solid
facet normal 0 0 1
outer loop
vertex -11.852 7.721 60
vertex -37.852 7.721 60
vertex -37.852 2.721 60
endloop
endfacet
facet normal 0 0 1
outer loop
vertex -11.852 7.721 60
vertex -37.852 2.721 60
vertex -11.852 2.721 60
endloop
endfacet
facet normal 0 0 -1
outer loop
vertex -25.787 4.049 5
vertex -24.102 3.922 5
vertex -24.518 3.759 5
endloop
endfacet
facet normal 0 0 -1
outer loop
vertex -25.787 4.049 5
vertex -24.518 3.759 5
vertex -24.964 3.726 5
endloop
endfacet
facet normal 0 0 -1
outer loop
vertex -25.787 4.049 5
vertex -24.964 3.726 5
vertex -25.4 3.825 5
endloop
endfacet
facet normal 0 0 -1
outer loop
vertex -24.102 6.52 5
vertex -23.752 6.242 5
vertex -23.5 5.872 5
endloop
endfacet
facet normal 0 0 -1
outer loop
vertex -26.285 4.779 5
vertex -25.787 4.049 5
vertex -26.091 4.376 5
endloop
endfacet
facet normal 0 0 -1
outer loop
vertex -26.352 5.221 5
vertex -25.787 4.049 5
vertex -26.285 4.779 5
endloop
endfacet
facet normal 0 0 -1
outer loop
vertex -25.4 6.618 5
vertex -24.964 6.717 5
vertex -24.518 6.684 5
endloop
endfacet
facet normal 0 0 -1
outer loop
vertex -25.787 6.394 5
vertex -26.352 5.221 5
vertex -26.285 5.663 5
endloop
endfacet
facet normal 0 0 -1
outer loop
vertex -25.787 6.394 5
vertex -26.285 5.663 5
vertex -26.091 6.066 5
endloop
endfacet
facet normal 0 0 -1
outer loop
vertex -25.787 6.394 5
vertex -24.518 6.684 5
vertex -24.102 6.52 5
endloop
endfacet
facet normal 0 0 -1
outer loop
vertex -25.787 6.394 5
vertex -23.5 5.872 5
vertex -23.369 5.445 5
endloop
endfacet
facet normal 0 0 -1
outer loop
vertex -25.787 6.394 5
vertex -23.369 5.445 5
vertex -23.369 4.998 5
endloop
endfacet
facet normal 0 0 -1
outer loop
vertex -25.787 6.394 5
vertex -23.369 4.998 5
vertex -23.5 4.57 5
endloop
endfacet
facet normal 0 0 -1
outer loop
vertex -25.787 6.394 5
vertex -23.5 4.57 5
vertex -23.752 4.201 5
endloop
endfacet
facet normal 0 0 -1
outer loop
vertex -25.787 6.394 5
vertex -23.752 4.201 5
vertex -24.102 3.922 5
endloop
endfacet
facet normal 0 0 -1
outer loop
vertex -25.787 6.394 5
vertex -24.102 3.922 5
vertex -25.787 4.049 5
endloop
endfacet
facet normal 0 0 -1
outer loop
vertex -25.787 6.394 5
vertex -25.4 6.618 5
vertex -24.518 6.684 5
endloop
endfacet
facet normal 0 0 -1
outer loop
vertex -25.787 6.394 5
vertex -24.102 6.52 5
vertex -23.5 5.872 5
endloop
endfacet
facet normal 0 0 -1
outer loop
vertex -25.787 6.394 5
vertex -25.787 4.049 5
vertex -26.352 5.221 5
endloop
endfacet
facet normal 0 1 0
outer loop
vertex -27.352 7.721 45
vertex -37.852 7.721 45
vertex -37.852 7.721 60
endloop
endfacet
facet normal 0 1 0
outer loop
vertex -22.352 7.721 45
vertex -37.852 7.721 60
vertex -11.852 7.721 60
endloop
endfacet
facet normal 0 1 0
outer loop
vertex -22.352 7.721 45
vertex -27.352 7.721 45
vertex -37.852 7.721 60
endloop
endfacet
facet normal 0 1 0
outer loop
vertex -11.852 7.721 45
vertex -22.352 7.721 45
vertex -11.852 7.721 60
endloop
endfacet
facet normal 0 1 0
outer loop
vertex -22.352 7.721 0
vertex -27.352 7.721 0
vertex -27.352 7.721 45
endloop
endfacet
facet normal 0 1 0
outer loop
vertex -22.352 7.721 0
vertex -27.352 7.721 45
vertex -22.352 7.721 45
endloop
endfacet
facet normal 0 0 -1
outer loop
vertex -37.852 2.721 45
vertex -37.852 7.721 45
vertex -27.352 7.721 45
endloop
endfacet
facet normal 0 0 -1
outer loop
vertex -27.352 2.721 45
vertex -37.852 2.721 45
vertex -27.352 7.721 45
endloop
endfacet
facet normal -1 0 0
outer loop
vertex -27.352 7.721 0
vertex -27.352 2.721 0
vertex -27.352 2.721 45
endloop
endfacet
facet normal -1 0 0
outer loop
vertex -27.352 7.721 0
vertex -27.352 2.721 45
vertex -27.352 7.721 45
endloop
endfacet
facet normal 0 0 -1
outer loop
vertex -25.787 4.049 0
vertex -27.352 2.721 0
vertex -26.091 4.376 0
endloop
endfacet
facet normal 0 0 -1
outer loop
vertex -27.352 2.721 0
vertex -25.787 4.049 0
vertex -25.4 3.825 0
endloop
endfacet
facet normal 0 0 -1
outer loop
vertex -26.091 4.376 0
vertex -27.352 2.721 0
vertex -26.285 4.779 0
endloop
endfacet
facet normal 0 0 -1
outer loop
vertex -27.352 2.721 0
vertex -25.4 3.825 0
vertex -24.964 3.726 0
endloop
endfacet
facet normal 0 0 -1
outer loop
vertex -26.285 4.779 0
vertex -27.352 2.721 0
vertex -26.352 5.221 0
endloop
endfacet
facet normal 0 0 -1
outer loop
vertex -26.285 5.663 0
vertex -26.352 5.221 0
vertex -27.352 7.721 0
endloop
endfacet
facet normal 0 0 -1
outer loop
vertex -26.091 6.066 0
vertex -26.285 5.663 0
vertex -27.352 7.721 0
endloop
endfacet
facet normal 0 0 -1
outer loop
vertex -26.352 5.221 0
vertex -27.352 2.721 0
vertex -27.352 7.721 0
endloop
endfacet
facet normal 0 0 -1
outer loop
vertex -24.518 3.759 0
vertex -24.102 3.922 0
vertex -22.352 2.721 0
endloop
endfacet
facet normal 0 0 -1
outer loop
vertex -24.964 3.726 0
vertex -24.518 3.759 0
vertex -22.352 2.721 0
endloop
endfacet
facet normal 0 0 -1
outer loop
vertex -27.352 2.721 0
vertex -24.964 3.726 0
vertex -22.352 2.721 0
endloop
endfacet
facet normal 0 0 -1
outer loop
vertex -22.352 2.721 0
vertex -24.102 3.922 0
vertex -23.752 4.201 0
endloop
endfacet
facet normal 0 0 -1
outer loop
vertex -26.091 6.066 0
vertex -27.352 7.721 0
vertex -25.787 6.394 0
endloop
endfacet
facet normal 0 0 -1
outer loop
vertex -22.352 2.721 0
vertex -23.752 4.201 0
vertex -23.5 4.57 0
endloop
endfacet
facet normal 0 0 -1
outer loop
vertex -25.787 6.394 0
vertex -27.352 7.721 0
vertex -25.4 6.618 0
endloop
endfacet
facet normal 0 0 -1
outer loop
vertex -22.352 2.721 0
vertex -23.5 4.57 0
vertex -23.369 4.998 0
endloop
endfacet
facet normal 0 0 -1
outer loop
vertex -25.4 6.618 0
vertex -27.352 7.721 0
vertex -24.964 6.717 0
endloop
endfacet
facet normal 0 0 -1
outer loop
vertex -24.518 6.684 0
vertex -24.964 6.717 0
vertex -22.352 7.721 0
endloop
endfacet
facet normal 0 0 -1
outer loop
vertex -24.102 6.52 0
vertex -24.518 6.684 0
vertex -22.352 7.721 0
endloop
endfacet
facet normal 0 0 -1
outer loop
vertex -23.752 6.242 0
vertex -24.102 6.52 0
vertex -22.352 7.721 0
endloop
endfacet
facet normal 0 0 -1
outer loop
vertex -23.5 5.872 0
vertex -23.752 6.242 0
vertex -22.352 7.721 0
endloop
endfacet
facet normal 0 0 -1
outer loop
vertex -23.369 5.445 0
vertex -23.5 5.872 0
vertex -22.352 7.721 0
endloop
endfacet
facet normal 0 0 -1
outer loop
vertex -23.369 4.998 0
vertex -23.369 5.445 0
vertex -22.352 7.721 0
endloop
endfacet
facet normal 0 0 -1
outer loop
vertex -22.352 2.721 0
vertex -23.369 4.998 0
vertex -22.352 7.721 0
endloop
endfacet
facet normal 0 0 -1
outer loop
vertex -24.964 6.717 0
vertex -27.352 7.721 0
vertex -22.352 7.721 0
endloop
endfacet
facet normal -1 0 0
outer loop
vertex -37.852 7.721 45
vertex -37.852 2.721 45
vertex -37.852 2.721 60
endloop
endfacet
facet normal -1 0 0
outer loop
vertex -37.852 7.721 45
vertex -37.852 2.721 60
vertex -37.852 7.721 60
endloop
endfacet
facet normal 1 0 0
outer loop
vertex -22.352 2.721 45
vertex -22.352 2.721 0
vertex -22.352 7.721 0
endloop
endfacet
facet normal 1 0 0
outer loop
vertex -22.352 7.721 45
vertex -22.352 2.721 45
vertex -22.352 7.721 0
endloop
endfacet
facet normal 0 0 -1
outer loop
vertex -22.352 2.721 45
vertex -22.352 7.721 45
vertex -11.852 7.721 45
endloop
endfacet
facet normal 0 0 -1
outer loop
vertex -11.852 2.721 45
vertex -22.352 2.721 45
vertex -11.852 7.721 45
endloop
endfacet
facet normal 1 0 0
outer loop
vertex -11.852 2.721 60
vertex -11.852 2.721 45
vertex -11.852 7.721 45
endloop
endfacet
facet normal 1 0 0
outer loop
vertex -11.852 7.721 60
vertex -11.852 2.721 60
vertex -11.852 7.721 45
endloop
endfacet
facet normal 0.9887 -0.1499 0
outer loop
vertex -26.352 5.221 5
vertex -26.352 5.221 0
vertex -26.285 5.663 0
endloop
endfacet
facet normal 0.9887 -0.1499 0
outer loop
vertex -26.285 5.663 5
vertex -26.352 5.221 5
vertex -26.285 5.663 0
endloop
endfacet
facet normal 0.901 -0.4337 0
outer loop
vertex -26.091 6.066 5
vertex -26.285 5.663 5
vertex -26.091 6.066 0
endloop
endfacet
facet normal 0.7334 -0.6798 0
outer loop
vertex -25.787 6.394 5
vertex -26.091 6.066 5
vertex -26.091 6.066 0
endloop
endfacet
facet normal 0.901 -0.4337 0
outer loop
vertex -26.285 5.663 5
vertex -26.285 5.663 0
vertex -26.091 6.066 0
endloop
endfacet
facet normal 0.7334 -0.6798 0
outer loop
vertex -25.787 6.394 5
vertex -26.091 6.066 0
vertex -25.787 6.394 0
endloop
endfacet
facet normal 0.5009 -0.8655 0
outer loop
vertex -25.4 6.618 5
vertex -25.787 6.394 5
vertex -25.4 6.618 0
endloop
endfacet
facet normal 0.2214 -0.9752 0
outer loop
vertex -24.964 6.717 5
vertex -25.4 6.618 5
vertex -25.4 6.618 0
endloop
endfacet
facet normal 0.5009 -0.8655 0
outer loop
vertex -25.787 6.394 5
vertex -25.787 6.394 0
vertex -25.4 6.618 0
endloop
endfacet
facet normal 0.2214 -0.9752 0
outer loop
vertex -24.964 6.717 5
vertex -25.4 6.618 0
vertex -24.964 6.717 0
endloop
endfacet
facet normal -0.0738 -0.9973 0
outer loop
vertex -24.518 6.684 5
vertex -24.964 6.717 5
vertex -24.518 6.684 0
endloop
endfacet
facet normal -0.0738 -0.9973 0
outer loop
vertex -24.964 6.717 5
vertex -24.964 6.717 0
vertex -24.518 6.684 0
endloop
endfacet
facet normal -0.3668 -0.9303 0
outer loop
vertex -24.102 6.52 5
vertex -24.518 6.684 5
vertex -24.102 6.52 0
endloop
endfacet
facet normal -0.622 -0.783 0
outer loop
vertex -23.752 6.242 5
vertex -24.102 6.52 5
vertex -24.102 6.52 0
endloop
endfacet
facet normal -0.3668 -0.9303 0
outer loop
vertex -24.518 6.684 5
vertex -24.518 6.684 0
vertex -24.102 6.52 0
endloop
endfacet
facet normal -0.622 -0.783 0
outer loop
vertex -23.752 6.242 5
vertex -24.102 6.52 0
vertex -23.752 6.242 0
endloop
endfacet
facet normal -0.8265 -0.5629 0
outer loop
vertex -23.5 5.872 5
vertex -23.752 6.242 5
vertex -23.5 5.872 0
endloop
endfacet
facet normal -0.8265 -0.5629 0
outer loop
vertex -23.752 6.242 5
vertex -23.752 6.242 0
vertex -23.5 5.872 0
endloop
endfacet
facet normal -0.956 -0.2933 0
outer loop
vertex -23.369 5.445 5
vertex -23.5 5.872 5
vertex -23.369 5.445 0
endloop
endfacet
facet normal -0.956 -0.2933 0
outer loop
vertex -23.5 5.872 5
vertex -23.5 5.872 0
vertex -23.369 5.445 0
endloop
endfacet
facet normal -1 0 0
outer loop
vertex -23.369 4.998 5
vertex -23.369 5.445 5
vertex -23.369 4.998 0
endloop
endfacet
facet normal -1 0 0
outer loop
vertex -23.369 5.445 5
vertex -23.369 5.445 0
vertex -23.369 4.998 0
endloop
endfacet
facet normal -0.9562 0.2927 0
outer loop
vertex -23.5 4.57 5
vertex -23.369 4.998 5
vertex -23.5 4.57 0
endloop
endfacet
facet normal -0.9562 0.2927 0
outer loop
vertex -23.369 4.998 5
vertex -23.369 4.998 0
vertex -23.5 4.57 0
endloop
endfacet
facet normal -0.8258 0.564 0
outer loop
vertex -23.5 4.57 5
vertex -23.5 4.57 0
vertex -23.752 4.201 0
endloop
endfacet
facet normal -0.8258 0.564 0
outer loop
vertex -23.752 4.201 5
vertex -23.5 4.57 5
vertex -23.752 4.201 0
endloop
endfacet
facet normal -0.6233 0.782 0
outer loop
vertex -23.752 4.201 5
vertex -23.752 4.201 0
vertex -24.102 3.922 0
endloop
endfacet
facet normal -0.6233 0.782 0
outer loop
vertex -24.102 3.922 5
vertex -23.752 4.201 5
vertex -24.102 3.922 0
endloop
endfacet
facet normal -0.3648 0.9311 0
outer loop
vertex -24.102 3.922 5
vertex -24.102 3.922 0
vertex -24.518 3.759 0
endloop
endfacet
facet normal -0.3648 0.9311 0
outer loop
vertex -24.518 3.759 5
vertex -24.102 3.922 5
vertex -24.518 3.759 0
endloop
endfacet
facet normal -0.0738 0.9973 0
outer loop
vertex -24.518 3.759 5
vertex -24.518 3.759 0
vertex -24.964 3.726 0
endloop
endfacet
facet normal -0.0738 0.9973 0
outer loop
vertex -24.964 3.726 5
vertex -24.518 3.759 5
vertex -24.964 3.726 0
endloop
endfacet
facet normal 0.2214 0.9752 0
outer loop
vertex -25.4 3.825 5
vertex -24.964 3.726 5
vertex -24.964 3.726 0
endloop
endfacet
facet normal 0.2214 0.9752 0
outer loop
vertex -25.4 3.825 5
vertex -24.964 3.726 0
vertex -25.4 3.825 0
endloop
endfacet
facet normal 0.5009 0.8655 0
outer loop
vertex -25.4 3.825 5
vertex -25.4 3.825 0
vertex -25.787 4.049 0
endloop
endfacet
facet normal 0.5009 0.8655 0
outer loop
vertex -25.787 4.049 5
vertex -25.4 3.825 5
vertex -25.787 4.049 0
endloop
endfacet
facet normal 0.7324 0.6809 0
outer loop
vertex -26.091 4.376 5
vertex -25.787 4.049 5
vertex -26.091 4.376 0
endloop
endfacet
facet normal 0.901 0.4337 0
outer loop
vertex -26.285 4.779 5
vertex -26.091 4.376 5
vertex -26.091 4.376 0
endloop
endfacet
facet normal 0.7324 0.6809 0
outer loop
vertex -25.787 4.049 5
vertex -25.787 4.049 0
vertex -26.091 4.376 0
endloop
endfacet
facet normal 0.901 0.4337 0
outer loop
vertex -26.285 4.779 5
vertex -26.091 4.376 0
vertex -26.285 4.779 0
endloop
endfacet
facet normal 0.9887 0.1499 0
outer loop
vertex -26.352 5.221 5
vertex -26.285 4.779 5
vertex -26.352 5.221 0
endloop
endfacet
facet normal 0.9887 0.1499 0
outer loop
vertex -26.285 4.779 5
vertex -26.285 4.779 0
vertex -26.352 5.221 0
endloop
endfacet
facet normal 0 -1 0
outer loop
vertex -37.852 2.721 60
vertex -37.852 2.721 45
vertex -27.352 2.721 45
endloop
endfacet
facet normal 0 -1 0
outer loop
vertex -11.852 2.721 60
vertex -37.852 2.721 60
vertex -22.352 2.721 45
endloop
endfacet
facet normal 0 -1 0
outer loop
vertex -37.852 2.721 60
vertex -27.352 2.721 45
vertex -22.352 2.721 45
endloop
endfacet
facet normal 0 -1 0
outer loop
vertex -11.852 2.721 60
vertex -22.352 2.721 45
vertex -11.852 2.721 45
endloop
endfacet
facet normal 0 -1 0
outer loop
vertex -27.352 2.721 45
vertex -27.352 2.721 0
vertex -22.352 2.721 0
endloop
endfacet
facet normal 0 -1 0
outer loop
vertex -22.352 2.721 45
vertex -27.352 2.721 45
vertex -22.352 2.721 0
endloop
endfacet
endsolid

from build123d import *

# Parameters (mm, degrees)
SKETCH1_W           = 5
SKETCH1_H           = 5
BOSS_EXTRUDE1_DEPTH = 45
SKETCH2_W           = 26
SKETCH2_H           = 5
BOSS_EXTRUDE2_DEPTH = 15
SKETCH3_R           = 1.5
CUT_EXTRUDE1_DEPTH  = 5


with BuildPart() as part:
    # Sketch1 → Boss-Extrude1 (new body)
    with BuildSketch(Plane.XY):
        with Locations((-24.851797929, 5.221320947)):
            Rectangle(SKETCH1_W, SKETCH1_H)
    extrude(amount=BOSS_EXTRUDE1_DEPTH)

    # Sketch2 → Boss-Extrude2 (add)
    with BuildSketch(Plane.XY.offset(45)):
        with Locations((-24.851797929, 5.221320947)):
            Rectangle(SKETCH2_W, SKETCH2_H)
    extrude(amount=BOSS_EXTRUDE2_DEPTH)

    # Sketch3 → Cut-Extrude1 (cut)
    with BuildSketch(Plane(origin=(0, 0, 0), x_dir=(-1, 0, 0), z_dir=(0, 0, -1))):
        with Locations((24.851797929, 5.221320947)):
            Circle(SKETCH3_R)
    extrude(amount=-CUT_EXTRUDE1_DEPTH, mode=Mode.SUBTRACT)


solid = part.part
